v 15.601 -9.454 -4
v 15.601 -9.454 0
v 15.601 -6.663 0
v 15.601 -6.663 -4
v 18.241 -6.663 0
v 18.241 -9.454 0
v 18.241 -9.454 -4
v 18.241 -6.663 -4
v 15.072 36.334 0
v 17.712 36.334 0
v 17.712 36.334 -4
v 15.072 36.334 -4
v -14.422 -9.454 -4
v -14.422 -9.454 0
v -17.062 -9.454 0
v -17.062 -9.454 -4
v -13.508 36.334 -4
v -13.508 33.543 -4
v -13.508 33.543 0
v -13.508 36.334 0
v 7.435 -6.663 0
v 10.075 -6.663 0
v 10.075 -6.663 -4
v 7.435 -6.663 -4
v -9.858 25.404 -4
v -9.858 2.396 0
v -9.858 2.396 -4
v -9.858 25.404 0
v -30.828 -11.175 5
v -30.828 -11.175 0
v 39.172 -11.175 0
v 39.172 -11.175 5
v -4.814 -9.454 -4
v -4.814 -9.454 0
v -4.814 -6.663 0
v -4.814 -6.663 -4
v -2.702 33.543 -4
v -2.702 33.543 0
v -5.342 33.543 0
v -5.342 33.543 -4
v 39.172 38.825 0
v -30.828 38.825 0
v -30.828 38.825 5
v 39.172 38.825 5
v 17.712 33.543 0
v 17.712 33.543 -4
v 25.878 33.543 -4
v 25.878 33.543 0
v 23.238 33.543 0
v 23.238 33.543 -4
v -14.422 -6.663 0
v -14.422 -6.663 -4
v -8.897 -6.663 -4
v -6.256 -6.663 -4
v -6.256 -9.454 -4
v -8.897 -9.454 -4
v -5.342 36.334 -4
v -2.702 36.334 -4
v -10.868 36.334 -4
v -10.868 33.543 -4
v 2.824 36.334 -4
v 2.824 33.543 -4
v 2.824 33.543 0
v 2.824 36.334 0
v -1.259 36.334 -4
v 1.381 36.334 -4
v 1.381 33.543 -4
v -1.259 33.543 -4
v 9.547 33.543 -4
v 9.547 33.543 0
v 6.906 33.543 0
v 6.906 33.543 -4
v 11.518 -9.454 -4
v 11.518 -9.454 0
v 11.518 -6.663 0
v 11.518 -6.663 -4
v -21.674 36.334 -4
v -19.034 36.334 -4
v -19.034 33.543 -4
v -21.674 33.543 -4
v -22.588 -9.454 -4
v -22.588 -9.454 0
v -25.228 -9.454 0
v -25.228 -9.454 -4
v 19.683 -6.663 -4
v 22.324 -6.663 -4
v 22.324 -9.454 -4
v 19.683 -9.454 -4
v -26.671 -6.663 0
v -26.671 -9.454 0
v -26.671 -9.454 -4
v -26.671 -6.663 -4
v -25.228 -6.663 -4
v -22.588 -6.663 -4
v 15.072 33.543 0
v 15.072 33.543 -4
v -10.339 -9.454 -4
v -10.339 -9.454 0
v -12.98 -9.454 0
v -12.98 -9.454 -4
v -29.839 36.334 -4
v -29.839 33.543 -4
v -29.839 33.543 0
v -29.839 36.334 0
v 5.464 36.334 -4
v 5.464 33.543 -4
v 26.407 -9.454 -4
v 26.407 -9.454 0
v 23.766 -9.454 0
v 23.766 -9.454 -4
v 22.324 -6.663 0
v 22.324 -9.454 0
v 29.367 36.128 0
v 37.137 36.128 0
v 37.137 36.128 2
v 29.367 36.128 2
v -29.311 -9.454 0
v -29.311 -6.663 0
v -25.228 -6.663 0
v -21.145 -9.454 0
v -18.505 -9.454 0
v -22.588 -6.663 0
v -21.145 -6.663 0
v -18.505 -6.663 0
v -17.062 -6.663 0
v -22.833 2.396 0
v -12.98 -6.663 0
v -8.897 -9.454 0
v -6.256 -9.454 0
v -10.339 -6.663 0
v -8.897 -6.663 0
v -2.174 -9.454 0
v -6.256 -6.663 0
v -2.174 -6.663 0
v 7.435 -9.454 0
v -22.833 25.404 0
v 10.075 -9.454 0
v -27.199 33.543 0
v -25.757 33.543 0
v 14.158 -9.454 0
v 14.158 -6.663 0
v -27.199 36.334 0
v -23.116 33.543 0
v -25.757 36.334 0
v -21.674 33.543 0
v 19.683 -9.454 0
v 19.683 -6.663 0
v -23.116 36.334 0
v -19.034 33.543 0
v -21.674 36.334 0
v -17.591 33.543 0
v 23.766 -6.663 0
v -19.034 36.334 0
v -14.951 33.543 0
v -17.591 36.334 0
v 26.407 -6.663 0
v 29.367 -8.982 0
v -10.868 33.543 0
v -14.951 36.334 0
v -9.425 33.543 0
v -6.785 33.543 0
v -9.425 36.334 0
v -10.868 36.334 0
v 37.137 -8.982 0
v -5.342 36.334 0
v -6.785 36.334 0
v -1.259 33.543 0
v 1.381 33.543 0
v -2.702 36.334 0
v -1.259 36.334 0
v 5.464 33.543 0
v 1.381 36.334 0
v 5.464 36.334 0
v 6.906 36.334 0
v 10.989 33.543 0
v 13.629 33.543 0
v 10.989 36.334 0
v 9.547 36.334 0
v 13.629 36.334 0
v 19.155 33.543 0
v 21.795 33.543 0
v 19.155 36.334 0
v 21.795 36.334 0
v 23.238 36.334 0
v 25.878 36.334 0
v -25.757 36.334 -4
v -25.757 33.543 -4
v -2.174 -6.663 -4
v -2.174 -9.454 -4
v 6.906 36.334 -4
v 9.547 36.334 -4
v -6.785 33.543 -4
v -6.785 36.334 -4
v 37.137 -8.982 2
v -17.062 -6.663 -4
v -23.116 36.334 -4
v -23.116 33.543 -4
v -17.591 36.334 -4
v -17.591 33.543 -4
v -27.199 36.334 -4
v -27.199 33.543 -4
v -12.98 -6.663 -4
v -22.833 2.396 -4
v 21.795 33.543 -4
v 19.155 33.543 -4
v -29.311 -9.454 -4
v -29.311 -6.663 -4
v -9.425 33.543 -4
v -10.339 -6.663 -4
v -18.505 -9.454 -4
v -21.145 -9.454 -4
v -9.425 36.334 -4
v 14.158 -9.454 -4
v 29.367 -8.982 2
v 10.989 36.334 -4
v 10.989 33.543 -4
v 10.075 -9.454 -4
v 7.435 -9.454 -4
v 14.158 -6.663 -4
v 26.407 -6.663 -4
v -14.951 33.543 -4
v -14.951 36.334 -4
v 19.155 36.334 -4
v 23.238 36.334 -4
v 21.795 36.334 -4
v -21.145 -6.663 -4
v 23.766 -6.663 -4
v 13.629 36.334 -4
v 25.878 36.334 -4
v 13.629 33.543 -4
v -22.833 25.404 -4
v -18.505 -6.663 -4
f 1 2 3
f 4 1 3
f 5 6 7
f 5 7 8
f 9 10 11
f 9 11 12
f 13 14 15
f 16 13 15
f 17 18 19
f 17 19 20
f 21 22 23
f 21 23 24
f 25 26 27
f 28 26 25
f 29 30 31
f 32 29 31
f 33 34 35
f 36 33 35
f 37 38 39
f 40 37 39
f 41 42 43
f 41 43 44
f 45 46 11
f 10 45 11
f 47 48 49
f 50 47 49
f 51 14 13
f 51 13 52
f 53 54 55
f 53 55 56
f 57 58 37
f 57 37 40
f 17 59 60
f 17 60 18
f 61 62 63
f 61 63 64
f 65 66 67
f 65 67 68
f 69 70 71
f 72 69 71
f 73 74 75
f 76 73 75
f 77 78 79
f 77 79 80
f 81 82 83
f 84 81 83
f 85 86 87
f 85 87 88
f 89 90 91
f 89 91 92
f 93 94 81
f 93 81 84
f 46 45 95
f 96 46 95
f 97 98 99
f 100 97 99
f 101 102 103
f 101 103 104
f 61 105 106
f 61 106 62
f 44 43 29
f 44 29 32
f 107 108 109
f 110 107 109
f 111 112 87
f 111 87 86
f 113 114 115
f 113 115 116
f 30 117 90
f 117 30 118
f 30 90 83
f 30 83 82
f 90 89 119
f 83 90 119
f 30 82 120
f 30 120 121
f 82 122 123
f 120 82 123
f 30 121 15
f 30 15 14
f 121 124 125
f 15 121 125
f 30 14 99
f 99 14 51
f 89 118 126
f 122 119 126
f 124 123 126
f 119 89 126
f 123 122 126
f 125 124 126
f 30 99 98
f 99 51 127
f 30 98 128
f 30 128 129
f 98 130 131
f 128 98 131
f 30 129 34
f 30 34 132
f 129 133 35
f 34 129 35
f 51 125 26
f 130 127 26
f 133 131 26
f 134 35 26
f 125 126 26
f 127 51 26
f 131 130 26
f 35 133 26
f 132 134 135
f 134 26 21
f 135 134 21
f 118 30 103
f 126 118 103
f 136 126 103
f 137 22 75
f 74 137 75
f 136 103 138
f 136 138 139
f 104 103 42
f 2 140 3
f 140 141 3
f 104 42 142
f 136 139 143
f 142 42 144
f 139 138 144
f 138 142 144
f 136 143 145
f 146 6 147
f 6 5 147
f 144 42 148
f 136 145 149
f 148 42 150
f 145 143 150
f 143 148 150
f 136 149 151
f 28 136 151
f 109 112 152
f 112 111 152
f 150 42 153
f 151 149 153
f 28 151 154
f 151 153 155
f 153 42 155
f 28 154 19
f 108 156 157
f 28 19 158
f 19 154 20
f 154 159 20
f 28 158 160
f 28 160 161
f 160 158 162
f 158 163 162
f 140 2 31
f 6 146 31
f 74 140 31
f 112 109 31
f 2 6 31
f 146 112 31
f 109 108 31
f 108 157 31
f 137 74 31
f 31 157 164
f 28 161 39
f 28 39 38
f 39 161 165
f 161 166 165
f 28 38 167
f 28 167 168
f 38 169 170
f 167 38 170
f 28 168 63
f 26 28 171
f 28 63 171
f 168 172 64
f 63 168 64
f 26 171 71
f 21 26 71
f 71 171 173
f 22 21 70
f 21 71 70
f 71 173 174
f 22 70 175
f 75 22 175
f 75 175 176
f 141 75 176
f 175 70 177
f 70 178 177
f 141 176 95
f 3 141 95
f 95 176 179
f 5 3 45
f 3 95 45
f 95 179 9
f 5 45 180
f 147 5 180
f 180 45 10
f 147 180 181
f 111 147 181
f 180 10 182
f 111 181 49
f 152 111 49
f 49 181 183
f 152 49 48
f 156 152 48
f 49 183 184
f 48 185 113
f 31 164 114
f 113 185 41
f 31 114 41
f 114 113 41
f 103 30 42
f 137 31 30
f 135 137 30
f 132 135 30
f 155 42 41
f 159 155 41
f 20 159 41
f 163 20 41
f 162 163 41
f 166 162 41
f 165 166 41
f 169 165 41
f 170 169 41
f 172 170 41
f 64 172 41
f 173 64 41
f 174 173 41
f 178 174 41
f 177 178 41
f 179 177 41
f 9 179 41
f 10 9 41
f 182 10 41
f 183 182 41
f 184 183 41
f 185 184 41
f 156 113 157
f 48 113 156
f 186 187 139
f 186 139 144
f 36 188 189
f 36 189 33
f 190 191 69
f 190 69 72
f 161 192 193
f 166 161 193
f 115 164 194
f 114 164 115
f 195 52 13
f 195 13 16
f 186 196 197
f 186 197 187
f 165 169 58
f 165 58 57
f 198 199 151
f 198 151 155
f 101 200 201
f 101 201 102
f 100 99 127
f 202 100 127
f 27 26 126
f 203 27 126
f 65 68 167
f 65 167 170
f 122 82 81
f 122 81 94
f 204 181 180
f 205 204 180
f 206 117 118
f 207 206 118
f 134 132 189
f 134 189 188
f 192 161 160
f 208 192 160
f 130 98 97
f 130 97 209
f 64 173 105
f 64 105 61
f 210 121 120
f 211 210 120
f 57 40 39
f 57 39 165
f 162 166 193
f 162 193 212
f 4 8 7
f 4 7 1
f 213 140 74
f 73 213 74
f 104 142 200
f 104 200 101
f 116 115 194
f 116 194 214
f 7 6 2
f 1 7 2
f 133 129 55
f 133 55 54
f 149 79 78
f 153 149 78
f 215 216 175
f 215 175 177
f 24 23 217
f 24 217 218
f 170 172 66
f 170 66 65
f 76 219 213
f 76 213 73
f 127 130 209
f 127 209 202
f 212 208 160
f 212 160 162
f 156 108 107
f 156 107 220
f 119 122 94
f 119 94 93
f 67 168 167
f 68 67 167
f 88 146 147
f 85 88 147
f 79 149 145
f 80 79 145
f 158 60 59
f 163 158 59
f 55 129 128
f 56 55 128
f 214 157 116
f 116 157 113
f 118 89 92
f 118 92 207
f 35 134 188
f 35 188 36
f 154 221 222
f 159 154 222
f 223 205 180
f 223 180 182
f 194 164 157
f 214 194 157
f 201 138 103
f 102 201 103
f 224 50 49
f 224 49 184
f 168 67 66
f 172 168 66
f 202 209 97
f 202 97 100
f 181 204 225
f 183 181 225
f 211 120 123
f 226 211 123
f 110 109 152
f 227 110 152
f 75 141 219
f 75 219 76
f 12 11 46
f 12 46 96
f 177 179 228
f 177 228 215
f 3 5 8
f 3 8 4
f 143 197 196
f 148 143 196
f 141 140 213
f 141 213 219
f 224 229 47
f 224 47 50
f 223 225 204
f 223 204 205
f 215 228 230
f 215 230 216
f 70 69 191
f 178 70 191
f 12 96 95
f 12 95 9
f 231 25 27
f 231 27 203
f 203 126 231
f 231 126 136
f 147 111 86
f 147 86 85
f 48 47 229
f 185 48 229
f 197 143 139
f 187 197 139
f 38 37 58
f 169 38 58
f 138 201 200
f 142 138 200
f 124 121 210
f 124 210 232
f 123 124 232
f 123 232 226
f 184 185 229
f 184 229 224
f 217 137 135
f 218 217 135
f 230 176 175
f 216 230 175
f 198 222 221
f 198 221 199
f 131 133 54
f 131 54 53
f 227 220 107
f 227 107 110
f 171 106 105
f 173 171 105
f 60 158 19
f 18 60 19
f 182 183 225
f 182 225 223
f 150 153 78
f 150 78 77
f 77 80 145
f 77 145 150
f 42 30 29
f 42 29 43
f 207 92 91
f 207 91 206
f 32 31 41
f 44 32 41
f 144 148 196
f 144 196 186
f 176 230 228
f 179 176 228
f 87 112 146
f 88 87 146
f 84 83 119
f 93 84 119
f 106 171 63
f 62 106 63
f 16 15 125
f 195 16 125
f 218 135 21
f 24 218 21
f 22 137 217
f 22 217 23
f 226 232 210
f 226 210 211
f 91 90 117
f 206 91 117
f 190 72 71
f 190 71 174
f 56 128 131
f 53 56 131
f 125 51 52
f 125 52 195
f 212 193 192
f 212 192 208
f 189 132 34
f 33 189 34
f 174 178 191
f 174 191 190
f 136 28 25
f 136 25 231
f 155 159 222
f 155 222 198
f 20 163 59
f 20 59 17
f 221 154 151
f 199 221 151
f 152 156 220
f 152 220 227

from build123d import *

# Parameters (mm, degrees)
SKETCH1_W           = 70
SKETCH1_H           = 50
BOSS_EXTRUDE1_DEPTH = 5
SKETCH2_W           = 2.640170668
SKETCH2_H           = 2.791037564
SKETCH2_W_2         = 2.640170669
BOSS_EXTRUDE2_DEPTH = 4
SKETCH3_W           = 7.769645109
SKETCH3_H           = 45.109201702
CUT_EXTRUDE2_DEPTH  = 2
SKETCH4_W           = 12.974552998
SKETCH4_H           = 23.007201537
BOSS_EXTRUDE3_DEPTH = 4


with BuildPart() as part:
    # Sketch1 → Boss-Extrude1 (new body)
    with BuildSketch(Plane.XY):
        with Locations((4.17218543, 13.824503311)):
            Rectangle(SKETCH1_W, SKETCH1_H)
    extrude(amount=BOSS_EXTRUDE1_DEPTH)

    # Sketch2 → Boss-Extrude2 (add)
    with BuildSketch(Plane(origin=(0, 0, 0), x_dir=(-1, 0, 0), z_dir=(0, 0, -1))):
        with Locations((-24.557996106, 34.938427472)):
            Rectangle(SKETCH2_W, SKETCH2_H)
        with Locations((-20.475121474, 34.938427472)):
            Rectangle(SKETCH2_W, SKETCH2_H)
        with Locations((-16.392246842, 34.938427472)):
            Rectangle(SKETCH2_W_2, SKETCH2_H)
        with Locations((-12.309372209, 34.938427472)):
            Rectangle(SKETCH2_W, SKETCH2_H)
        with Locations((-8.226497577, 34.938427472)):
            Rectangle(SKETCH2_W, SKETCH2_H)
        with Locations((-4.143622945, 34.938427472)):
            Rectangle(SKETCH2_W_2, SKETCH2_H)
        with Locations((-0.060748312, 34.938427472)):
            Rectangle(SKETCH2_W, SKETCH2_H)
        with Locations((4.02212632, 34.938427472)):
            Rectangle(SKETCH2_W, SKETCH2_H)
        with Locations((8.105000952, 34.938427472)):
            Rectangle(SKETCH2_W, SKETCH2_H)
        with Locations((12.187875585, 34.938427472)):
            Rectangle(SKETCH2_W, SKETCH2_H)
        with Locations((16.270750217, 34.938427472)):
            Rectangle(SKETCH2_W, SKETCH2_H)
        with Locations((20.353624849, 34.938427472)):
            Rectangle(SKETCH2_W, SKETCH2_H)
        with Locations((24.436499482, 34.938427472)):
            Rectangle(SKETCH2_W_2, SKETCH2_H)
        with Locations((28.519374114, 34.938427472)):
            Rectangle(SKETCH2_W, SKETCH2_H)
        with Locations((-25.086447815, -8.058325182)):
            Rectangle(SKETCH2_W, SKETCH2_H)
        with Locations((-21.003573182, -8.058325182)):
            Rectangle(SKETCH2_W, SKETCH2_H)
        with Locations((-16.92069855, -8.058325182)):
            Rectangle(SKETCH2_W, SKETCH2_H)
        with Locations((-12.837823918, -8.058325182)):
            Rectangle(SKETCH2_W, SKETCH2_H)
        with Locations((-8.754949286, -8.058325182)):
            Rectangle(SKETCH2_W_2, SKETCH2_H)
        with Locations((3.493674612, -8.058325182)):
            Rectangle(SKETCH2_W_2, SKETCH2_H)
        with Locations((7.576549244, -8.058325182)):
            Rectangle(SKETCH2_W, SKETCH2_H)
        with Locations((11.659423876, -8.058325182)):
            Rectangle(SKETCH2_W, SKETCH2_H)
        with Locations((15.742298508, -8.058325182)):
            Rectangle(SKETCH2_W, SKETCH2_H)
        with Locations((19.825173141, -8.058325182)):
            Rectangle(SKETCH2_W, SKETCH2_H)
        with Locations((23.908047773, -8.058325182)):
            Rectangle(SKETCH2_W, SKETCH2_H)
        with Locations((27.990922405, -8.058325182)):
            Rectangle(SKETCH2_W, SKETCH2_H)
    extrude(amount=BOSS_EXTRUDE2_DEPTH)

    # Sketch3 → Cut-Extrude2 (cut)
    with BuildSketch(Plane(origin=(0, 0, 0), x_dir=(-1, 0, 0), z_dir=(0, 0, -1))):
        with Locations((-33.251779505, 13.57301761)):
            Rectangle(SKETCH3_W, SKETCH3_H)
    extrude(amount=-CUT_EXTRUDE2_DEPTH, mode=Mode.SUBTRACT)

    # Sketch4 → Boss-Extrude3 (add)
    with BuildSketch(Plane(origin=(0, 0, 0), x_dir=(-1, 0, 0), z_dir=(0, 0, -1))):
        with Locations((16.345712334, 13.899936759)):
            Rectangle(SKETCH4_W, SKETCH4_H)
    extrude(amount=BOSS_EXTRUDE3_DEPTH)


solid = part.part
